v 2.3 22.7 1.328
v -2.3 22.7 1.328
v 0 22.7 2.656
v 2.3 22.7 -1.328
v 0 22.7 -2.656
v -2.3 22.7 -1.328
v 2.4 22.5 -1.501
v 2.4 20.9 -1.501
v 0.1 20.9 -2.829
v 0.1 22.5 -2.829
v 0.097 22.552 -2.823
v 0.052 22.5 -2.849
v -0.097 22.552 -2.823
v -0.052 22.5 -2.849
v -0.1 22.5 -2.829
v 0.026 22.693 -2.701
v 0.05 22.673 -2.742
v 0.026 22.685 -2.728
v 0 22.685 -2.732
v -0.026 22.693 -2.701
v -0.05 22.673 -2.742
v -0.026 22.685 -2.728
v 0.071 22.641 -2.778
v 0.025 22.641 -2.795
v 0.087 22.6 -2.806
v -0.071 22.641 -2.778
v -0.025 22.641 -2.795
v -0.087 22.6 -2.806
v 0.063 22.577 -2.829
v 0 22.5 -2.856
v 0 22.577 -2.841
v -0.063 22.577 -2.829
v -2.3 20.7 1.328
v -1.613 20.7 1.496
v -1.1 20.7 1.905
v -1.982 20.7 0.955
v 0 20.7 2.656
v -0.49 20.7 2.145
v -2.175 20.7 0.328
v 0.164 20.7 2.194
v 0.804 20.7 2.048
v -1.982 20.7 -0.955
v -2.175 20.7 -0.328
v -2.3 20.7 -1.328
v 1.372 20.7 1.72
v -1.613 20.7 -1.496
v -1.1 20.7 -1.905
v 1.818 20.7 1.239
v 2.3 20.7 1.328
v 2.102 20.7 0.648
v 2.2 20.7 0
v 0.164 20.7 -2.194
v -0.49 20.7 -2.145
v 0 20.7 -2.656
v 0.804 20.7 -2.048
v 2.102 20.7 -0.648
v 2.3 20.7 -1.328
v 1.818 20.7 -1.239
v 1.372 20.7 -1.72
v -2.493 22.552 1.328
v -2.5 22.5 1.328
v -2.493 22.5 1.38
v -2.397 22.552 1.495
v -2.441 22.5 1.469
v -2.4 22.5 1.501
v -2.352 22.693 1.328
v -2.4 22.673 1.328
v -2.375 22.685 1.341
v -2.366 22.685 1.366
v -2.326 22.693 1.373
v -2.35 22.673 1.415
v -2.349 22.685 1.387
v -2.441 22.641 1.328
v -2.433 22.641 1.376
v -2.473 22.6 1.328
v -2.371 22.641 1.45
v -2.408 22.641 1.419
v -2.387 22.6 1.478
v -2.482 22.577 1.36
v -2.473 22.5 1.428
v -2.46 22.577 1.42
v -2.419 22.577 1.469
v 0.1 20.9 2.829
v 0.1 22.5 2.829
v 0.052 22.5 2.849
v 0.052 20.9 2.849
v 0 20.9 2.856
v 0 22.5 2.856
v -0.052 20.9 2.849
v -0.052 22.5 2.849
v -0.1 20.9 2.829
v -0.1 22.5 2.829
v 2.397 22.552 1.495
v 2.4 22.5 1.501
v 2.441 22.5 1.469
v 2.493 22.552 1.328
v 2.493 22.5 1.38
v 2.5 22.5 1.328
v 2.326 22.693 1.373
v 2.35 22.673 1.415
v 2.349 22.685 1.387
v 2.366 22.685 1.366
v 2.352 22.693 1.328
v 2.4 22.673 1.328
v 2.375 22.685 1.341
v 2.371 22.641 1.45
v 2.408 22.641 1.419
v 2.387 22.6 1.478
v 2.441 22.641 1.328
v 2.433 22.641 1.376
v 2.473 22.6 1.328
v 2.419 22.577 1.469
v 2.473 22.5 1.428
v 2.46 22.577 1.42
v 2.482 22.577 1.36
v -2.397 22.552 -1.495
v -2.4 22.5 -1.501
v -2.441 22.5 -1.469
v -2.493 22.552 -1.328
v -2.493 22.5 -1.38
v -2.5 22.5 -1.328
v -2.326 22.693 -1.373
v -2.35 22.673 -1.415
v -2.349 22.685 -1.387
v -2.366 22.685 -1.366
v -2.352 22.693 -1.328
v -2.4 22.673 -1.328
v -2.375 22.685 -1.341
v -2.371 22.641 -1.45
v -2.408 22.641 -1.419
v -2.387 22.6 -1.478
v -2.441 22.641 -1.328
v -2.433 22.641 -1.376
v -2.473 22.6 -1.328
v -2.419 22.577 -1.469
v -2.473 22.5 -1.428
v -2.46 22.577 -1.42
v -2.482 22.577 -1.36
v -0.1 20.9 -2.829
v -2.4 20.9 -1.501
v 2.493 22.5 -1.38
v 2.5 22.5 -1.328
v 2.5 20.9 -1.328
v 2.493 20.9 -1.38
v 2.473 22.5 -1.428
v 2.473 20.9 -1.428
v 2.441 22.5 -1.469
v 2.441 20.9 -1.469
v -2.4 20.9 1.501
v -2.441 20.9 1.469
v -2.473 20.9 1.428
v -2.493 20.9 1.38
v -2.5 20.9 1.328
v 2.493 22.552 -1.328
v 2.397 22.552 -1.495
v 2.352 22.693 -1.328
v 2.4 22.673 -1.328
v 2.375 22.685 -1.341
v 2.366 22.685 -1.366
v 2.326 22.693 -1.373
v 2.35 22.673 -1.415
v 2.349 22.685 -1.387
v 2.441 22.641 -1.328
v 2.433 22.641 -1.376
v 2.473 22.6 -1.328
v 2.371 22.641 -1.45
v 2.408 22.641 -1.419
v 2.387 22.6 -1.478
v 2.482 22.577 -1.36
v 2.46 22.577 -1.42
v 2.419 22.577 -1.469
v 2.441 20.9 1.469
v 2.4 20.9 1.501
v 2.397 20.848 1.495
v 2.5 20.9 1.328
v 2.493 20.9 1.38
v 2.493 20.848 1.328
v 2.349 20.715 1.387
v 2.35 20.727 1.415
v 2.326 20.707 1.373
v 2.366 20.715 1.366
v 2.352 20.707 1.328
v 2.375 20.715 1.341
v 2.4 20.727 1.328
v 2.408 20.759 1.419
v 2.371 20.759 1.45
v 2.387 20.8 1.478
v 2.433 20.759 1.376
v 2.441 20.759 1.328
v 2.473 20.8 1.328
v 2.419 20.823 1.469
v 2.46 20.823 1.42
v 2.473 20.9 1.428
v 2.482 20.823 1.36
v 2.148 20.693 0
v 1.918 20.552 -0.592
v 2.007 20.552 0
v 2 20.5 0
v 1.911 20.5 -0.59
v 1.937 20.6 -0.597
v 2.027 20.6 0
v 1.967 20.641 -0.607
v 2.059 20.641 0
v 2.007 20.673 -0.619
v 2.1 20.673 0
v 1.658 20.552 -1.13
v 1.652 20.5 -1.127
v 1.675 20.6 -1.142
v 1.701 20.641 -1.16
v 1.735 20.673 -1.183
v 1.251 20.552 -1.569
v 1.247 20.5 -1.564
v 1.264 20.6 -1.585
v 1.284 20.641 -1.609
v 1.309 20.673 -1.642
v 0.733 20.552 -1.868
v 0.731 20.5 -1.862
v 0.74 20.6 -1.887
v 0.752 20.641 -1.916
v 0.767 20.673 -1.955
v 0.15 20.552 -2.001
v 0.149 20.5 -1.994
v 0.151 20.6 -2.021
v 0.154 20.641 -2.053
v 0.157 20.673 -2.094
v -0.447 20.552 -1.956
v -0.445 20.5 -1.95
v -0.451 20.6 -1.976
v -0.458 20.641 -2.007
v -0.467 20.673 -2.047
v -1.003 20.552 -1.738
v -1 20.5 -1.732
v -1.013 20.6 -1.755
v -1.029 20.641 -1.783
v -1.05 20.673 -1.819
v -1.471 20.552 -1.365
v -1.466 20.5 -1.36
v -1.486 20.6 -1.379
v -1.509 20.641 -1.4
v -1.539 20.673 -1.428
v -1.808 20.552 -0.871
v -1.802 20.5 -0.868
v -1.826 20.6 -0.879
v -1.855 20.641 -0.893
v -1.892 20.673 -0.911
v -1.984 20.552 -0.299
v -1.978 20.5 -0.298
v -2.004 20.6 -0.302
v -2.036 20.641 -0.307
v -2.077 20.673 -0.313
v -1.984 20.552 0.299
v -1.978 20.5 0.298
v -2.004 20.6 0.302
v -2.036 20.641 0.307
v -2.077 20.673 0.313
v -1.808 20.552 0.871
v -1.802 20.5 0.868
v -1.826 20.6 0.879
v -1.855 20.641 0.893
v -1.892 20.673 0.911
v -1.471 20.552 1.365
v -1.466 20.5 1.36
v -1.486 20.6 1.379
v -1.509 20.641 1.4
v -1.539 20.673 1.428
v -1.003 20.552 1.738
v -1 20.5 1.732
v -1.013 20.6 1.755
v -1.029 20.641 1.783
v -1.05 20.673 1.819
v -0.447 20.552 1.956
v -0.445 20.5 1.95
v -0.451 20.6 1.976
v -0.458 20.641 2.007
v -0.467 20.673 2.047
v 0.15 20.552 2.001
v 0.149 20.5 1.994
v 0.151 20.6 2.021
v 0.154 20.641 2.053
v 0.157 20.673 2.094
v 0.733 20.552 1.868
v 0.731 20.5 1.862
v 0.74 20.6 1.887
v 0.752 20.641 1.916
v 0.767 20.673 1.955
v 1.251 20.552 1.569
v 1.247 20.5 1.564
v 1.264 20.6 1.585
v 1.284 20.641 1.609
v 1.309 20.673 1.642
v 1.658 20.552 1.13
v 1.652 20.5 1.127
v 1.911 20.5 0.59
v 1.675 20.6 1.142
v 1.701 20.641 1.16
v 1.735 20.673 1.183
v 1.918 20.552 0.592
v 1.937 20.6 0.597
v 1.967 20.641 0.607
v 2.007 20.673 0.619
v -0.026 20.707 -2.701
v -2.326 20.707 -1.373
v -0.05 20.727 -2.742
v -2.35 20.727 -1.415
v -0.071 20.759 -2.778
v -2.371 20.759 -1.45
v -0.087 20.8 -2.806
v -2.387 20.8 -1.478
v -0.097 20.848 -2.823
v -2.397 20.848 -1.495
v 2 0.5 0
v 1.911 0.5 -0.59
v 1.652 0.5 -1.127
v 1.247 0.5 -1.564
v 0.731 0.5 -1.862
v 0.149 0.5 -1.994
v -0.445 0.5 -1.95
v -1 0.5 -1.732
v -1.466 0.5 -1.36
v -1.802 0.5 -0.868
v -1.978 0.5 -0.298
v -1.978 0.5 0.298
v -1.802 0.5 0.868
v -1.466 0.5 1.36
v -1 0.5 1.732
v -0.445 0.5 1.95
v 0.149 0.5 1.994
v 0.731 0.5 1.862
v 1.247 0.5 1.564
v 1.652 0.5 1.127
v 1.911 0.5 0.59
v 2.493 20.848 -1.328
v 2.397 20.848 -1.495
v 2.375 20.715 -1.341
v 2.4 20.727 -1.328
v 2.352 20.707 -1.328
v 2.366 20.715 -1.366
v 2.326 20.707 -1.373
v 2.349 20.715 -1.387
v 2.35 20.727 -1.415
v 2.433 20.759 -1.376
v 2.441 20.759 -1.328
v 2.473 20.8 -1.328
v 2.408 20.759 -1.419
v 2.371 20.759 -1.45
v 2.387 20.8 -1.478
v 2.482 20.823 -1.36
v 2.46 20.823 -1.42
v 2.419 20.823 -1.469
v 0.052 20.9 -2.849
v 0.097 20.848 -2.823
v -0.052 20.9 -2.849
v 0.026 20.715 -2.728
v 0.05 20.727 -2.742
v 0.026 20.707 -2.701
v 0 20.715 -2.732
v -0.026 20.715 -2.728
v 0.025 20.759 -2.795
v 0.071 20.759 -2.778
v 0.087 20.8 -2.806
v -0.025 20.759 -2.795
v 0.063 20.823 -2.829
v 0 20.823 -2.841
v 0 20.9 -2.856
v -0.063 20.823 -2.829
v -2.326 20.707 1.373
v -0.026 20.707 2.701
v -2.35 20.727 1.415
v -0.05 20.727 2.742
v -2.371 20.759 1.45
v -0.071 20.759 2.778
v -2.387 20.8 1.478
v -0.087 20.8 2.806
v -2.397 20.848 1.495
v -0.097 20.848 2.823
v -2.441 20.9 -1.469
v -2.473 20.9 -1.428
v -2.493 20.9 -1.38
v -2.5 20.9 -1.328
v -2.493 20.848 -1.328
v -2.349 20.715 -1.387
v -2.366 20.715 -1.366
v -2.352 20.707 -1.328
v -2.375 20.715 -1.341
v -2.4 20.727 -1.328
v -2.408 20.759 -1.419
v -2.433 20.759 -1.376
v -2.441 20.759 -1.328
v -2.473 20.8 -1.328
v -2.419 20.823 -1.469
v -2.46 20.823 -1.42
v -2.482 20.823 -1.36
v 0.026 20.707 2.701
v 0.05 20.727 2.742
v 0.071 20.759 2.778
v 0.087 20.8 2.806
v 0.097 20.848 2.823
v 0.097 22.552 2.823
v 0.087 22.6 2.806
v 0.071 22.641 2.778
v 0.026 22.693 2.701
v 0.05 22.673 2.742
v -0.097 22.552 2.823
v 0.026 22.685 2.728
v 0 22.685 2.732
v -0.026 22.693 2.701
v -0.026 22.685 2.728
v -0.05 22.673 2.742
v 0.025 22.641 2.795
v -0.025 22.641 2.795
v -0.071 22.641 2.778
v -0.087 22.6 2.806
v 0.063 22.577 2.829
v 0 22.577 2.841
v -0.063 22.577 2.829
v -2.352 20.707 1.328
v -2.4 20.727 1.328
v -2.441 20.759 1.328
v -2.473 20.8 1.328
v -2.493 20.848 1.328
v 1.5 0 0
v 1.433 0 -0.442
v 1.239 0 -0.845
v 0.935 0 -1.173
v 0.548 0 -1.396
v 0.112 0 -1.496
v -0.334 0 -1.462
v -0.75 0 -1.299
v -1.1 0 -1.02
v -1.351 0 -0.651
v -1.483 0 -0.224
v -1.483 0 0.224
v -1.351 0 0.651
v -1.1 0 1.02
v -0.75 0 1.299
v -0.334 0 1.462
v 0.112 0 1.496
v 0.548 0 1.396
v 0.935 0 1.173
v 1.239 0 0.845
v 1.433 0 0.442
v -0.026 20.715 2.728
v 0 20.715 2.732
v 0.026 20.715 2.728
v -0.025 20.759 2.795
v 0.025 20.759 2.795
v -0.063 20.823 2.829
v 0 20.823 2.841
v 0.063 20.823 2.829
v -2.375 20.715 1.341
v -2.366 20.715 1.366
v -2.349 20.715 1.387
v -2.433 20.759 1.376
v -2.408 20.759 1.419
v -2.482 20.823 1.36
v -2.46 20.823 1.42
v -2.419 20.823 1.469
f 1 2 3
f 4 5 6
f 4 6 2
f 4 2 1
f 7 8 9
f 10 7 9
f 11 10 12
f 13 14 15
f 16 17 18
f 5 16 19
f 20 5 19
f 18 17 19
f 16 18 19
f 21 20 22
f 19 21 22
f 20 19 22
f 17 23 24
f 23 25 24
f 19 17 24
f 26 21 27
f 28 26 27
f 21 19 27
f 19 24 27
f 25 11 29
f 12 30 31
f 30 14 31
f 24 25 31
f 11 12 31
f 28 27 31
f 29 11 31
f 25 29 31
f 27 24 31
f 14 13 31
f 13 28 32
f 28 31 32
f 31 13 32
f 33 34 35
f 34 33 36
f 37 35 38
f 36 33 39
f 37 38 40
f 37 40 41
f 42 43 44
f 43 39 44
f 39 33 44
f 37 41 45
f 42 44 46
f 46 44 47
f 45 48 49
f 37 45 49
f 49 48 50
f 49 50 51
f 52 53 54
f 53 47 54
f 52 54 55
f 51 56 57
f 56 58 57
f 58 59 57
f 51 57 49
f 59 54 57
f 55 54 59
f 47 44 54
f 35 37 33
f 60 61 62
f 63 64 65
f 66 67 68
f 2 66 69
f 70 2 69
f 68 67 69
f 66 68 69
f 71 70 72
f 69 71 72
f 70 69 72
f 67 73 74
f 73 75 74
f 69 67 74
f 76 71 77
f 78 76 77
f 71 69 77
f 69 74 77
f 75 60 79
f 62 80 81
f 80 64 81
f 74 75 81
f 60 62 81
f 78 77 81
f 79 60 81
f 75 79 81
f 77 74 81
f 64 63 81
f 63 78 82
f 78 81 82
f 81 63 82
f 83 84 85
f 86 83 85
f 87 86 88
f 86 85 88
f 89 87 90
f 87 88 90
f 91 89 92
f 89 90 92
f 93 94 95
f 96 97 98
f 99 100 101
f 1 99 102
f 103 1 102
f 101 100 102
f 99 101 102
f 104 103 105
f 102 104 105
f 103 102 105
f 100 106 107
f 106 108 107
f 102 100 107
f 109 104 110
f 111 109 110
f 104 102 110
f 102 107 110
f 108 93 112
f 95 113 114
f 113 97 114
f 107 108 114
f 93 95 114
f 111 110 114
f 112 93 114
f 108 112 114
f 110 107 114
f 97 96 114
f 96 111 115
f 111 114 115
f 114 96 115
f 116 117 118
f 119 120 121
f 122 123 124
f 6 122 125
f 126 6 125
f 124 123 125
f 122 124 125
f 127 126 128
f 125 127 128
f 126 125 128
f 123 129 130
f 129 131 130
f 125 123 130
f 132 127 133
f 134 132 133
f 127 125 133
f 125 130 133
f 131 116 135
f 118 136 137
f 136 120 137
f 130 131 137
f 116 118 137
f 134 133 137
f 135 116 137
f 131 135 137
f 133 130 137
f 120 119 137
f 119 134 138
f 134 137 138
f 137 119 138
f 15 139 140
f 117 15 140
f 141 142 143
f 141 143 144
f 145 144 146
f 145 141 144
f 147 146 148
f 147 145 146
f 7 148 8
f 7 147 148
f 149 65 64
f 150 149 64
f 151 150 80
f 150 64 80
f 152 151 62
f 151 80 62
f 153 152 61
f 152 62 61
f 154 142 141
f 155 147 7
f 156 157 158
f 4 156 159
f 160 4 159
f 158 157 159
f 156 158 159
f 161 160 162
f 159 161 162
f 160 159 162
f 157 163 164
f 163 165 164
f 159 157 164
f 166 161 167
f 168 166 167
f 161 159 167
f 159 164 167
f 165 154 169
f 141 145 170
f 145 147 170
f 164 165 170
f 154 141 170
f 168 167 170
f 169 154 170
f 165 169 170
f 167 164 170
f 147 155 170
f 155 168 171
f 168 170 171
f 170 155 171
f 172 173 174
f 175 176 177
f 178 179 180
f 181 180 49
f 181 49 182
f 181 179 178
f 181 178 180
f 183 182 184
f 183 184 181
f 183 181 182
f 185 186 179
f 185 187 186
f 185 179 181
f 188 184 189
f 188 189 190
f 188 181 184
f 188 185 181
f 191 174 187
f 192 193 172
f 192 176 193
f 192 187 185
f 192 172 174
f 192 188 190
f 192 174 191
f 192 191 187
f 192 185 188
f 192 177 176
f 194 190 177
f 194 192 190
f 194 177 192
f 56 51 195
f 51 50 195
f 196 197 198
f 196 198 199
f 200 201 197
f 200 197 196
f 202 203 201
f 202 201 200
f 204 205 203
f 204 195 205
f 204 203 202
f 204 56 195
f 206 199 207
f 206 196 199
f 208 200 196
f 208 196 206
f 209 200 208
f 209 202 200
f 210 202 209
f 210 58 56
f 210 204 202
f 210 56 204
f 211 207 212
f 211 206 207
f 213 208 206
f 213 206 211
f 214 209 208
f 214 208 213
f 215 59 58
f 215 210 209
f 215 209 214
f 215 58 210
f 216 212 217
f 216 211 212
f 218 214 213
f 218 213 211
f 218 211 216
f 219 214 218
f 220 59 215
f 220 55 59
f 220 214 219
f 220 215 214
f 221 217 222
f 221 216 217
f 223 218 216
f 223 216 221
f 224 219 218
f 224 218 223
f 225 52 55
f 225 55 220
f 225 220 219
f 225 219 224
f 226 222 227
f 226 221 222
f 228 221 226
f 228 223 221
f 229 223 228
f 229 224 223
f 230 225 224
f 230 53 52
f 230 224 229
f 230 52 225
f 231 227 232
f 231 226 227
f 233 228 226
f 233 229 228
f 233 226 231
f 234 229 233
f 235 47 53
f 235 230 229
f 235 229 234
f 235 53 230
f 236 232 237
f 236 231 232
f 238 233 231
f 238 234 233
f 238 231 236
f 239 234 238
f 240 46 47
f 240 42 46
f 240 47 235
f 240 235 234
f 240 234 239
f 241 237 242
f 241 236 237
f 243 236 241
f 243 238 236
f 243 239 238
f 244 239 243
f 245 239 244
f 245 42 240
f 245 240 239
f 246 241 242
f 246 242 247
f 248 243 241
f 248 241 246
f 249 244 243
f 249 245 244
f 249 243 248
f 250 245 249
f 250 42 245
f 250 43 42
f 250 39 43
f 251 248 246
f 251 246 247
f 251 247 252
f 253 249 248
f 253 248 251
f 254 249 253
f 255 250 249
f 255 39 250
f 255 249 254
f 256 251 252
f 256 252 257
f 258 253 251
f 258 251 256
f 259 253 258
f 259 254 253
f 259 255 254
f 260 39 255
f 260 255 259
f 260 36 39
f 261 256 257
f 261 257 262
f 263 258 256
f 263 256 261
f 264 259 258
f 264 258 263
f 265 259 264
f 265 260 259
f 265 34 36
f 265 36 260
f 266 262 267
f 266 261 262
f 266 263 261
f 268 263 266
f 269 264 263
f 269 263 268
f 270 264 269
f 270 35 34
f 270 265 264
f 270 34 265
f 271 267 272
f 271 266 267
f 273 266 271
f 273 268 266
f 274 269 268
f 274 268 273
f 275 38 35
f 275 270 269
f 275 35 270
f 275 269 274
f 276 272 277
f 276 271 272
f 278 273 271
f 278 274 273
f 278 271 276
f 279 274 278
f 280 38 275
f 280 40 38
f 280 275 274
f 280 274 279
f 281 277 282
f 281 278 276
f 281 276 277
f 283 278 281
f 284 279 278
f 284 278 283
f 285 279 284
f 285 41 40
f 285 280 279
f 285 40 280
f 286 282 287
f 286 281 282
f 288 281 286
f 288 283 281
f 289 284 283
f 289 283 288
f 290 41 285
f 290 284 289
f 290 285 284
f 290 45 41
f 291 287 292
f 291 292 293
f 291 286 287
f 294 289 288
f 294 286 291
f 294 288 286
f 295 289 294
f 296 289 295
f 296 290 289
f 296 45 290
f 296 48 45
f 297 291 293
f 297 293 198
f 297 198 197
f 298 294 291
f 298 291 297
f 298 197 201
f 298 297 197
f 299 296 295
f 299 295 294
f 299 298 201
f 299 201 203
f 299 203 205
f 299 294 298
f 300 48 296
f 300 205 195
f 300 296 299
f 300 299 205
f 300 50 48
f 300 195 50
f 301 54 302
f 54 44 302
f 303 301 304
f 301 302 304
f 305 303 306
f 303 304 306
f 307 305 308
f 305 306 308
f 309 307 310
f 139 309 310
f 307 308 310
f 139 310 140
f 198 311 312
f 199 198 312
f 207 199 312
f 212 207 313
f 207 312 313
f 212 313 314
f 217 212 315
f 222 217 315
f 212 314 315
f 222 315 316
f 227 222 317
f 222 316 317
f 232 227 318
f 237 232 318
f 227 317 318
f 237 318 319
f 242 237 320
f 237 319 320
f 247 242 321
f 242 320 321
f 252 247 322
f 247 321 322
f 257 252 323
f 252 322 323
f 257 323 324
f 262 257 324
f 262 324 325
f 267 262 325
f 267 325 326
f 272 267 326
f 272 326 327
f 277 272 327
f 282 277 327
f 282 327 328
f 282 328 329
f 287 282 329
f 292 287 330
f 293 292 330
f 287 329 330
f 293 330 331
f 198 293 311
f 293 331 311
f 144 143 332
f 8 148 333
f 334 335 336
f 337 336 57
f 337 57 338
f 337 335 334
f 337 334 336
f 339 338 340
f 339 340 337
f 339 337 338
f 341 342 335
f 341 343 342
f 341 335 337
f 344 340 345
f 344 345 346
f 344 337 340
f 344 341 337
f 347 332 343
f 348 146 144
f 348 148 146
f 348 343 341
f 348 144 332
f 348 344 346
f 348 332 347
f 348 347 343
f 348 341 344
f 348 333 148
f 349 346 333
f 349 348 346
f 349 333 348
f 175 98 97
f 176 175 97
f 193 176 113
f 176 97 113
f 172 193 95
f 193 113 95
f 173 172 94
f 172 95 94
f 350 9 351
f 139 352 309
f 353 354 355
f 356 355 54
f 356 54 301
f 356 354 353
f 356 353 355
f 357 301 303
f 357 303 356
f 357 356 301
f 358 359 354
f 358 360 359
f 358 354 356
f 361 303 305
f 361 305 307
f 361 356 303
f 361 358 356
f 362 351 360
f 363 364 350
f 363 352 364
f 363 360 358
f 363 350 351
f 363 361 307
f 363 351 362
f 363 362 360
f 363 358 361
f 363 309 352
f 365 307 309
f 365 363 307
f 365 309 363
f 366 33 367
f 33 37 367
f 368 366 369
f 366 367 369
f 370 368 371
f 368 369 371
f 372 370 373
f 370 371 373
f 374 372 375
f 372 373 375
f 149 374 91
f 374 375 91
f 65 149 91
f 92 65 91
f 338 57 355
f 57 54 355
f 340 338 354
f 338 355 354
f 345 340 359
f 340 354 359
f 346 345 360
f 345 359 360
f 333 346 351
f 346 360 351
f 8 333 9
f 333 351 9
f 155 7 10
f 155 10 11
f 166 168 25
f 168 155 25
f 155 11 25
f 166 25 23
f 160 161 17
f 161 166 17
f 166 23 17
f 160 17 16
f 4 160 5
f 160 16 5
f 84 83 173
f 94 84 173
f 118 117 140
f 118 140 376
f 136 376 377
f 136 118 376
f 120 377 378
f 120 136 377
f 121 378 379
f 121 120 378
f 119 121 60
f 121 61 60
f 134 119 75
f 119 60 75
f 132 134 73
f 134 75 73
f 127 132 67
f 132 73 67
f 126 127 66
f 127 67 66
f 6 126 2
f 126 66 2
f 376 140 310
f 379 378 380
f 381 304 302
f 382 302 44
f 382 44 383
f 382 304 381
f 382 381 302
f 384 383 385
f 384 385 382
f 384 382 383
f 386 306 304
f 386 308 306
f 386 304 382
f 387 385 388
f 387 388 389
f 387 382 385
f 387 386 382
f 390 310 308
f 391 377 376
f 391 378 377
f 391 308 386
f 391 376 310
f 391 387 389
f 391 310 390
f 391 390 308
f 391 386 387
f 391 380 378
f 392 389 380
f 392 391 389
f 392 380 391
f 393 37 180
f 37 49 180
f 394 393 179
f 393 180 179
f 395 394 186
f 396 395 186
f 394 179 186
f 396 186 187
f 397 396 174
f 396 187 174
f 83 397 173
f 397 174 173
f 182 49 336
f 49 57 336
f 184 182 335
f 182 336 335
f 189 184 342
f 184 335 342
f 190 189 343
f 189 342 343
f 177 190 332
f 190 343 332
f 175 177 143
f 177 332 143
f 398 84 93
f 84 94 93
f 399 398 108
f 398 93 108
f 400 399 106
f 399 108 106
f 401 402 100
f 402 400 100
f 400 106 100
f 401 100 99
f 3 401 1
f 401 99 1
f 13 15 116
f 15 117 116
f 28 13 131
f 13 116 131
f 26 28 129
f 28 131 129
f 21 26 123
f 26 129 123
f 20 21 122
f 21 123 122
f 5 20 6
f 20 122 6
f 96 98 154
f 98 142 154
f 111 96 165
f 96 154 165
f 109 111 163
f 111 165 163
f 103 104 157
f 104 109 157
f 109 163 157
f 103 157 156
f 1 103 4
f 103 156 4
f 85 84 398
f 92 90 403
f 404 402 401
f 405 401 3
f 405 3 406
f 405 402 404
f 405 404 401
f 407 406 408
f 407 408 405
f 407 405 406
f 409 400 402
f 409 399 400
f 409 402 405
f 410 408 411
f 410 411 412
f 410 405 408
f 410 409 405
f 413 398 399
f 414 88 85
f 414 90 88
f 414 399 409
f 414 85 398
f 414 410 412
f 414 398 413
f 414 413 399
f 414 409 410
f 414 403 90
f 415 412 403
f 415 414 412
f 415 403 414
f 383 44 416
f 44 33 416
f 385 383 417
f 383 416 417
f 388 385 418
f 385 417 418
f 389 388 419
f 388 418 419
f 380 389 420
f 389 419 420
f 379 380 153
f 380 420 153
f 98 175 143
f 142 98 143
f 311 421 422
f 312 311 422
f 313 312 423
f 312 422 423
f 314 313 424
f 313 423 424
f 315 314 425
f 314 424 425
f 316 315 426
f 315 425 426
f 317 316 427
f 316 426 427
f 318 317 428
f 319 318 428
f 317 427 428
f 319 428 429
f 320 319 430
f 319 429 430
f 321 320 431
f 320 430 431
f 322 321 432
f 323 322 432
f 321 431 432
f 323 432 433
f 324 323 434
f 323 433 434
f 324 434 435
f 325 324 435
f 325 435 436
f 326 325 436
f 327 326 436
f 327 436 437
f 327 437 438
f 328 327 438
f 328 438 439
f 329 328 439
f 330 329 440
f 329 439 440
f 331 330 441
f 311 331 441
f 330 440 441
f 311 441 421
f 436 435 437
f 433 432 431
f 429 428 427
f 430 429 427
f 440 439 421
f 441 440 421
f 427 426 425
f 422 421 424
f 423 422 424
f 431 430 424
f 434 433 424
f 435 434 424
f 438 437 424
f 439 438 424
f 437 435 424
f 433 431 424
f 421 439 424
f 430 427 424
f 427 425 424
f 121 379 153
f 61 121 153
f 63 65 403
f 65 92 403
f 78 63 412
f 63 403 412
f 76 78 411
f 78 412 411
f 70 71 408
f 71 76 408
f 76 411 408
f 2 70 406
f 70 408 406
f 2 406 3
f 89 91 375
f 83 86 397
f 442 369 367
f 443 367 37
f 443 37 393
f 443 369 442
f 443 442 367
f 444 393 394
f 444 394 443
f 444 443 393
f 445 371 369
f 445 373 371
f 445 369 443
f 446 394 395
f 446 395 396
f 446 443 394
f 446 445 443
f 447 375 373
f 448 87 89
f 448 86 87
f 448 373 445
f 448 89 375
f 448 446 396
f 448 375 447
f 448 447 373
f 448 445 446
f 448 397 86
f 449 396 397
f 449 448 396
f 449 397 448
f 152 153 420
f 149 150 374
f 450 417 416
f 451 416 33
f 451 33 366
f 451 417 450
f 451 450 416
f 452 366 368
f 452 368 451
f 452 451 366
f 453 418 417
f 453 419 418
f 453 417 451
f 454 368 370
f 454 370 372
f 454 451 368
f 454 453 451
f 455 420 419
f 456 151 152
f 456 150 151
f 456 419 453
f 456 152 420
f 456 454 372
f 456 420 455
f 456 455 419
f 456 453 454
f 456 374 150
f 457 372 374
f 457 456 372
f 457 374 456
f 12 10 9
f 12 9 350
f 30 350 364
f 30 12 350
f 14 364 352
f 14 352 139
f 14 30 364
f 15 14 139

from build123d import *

# Parameters (mm, degrees)
SKETCH1_R           = 2
BOSS_EXTRUDE1_DEPTH = 20.7
BOSS_EXTRUDE2_DEPTH = 2
CHAMFER1_SIZE       = 0.5
FILLET1_R           = 0.2


with BuildPart() as part:
    # Sketch1 → Boss-Extrude1 (new body)
    with BuildSketch(Plane(origin=(0, 0, 0), x_dir=(1, 0, 0), z_dir=(0, 1, 0))):
        Circle(SKETCH1_R)
    extrude(amount=BOSS_EXTRUDE1_DEPTH)

    # Sketch2 → Boss-Extrude2 (add)
    with BuildSketch(Plane(origin=(0, 20.7, 0), x_dir=(1, 0, 0), z_dir=(0, 1, 0))):
        Polygon((2.5, -1.443375673), (2.5, 1.443375673), (0, 2.886751346), (-2.5, 1.443375673), (-2.5, -1.443375673), (0, -2.886751346), align=None)
    extrude(amount=BOSS_EXTRUDE2_DEPTH)

    # Chamfer1
    chamfer1_edges = [part.edges().sort_by_distance(p)[0] for p in [
        (-2, 0, 0),
    ]]
    chamfer(chamfer1_edges, length=CHAMFER1_SIZE)

    # Fillet1
    fillet1_edges = [part.edges().sort_by_distance(p)[0] for p in [
        (-2, 20.7, 0),
        (1.25, 20.7, 2.165063509),
        (0, 21.7, 2.886751346),
        (2.5, 20.7, 0),
        (2.5, 21.7, 1.443375673),
        (1.25, 20.7, -2.165063509),
        (2.5, 21.7, -1.443375673),
        (-1.25, 20.7, -2.165063509),
        (0, 21.7, -2.886751346),
        (-2.5, 20.7, 0),
        (-2.5, 21.7, -1.443375673),
        (-1.25, 20.7, 2.165063509),
        (-2.5, 21.7, 1.443375673),
        (1.25, 22.7, 2.165063509),
        (2.5, 22.7, 0),
        (1.25, 22.7, -2.165063509),
        (-1.25, 22.7, -2.165063509),
        (-2.5, 22.7, 0),
        (-1.25, 22.7, 2.165063509),
    ]]
    fillet(fillet1_edges, radius=FILLET1_R)


solid = part.part
